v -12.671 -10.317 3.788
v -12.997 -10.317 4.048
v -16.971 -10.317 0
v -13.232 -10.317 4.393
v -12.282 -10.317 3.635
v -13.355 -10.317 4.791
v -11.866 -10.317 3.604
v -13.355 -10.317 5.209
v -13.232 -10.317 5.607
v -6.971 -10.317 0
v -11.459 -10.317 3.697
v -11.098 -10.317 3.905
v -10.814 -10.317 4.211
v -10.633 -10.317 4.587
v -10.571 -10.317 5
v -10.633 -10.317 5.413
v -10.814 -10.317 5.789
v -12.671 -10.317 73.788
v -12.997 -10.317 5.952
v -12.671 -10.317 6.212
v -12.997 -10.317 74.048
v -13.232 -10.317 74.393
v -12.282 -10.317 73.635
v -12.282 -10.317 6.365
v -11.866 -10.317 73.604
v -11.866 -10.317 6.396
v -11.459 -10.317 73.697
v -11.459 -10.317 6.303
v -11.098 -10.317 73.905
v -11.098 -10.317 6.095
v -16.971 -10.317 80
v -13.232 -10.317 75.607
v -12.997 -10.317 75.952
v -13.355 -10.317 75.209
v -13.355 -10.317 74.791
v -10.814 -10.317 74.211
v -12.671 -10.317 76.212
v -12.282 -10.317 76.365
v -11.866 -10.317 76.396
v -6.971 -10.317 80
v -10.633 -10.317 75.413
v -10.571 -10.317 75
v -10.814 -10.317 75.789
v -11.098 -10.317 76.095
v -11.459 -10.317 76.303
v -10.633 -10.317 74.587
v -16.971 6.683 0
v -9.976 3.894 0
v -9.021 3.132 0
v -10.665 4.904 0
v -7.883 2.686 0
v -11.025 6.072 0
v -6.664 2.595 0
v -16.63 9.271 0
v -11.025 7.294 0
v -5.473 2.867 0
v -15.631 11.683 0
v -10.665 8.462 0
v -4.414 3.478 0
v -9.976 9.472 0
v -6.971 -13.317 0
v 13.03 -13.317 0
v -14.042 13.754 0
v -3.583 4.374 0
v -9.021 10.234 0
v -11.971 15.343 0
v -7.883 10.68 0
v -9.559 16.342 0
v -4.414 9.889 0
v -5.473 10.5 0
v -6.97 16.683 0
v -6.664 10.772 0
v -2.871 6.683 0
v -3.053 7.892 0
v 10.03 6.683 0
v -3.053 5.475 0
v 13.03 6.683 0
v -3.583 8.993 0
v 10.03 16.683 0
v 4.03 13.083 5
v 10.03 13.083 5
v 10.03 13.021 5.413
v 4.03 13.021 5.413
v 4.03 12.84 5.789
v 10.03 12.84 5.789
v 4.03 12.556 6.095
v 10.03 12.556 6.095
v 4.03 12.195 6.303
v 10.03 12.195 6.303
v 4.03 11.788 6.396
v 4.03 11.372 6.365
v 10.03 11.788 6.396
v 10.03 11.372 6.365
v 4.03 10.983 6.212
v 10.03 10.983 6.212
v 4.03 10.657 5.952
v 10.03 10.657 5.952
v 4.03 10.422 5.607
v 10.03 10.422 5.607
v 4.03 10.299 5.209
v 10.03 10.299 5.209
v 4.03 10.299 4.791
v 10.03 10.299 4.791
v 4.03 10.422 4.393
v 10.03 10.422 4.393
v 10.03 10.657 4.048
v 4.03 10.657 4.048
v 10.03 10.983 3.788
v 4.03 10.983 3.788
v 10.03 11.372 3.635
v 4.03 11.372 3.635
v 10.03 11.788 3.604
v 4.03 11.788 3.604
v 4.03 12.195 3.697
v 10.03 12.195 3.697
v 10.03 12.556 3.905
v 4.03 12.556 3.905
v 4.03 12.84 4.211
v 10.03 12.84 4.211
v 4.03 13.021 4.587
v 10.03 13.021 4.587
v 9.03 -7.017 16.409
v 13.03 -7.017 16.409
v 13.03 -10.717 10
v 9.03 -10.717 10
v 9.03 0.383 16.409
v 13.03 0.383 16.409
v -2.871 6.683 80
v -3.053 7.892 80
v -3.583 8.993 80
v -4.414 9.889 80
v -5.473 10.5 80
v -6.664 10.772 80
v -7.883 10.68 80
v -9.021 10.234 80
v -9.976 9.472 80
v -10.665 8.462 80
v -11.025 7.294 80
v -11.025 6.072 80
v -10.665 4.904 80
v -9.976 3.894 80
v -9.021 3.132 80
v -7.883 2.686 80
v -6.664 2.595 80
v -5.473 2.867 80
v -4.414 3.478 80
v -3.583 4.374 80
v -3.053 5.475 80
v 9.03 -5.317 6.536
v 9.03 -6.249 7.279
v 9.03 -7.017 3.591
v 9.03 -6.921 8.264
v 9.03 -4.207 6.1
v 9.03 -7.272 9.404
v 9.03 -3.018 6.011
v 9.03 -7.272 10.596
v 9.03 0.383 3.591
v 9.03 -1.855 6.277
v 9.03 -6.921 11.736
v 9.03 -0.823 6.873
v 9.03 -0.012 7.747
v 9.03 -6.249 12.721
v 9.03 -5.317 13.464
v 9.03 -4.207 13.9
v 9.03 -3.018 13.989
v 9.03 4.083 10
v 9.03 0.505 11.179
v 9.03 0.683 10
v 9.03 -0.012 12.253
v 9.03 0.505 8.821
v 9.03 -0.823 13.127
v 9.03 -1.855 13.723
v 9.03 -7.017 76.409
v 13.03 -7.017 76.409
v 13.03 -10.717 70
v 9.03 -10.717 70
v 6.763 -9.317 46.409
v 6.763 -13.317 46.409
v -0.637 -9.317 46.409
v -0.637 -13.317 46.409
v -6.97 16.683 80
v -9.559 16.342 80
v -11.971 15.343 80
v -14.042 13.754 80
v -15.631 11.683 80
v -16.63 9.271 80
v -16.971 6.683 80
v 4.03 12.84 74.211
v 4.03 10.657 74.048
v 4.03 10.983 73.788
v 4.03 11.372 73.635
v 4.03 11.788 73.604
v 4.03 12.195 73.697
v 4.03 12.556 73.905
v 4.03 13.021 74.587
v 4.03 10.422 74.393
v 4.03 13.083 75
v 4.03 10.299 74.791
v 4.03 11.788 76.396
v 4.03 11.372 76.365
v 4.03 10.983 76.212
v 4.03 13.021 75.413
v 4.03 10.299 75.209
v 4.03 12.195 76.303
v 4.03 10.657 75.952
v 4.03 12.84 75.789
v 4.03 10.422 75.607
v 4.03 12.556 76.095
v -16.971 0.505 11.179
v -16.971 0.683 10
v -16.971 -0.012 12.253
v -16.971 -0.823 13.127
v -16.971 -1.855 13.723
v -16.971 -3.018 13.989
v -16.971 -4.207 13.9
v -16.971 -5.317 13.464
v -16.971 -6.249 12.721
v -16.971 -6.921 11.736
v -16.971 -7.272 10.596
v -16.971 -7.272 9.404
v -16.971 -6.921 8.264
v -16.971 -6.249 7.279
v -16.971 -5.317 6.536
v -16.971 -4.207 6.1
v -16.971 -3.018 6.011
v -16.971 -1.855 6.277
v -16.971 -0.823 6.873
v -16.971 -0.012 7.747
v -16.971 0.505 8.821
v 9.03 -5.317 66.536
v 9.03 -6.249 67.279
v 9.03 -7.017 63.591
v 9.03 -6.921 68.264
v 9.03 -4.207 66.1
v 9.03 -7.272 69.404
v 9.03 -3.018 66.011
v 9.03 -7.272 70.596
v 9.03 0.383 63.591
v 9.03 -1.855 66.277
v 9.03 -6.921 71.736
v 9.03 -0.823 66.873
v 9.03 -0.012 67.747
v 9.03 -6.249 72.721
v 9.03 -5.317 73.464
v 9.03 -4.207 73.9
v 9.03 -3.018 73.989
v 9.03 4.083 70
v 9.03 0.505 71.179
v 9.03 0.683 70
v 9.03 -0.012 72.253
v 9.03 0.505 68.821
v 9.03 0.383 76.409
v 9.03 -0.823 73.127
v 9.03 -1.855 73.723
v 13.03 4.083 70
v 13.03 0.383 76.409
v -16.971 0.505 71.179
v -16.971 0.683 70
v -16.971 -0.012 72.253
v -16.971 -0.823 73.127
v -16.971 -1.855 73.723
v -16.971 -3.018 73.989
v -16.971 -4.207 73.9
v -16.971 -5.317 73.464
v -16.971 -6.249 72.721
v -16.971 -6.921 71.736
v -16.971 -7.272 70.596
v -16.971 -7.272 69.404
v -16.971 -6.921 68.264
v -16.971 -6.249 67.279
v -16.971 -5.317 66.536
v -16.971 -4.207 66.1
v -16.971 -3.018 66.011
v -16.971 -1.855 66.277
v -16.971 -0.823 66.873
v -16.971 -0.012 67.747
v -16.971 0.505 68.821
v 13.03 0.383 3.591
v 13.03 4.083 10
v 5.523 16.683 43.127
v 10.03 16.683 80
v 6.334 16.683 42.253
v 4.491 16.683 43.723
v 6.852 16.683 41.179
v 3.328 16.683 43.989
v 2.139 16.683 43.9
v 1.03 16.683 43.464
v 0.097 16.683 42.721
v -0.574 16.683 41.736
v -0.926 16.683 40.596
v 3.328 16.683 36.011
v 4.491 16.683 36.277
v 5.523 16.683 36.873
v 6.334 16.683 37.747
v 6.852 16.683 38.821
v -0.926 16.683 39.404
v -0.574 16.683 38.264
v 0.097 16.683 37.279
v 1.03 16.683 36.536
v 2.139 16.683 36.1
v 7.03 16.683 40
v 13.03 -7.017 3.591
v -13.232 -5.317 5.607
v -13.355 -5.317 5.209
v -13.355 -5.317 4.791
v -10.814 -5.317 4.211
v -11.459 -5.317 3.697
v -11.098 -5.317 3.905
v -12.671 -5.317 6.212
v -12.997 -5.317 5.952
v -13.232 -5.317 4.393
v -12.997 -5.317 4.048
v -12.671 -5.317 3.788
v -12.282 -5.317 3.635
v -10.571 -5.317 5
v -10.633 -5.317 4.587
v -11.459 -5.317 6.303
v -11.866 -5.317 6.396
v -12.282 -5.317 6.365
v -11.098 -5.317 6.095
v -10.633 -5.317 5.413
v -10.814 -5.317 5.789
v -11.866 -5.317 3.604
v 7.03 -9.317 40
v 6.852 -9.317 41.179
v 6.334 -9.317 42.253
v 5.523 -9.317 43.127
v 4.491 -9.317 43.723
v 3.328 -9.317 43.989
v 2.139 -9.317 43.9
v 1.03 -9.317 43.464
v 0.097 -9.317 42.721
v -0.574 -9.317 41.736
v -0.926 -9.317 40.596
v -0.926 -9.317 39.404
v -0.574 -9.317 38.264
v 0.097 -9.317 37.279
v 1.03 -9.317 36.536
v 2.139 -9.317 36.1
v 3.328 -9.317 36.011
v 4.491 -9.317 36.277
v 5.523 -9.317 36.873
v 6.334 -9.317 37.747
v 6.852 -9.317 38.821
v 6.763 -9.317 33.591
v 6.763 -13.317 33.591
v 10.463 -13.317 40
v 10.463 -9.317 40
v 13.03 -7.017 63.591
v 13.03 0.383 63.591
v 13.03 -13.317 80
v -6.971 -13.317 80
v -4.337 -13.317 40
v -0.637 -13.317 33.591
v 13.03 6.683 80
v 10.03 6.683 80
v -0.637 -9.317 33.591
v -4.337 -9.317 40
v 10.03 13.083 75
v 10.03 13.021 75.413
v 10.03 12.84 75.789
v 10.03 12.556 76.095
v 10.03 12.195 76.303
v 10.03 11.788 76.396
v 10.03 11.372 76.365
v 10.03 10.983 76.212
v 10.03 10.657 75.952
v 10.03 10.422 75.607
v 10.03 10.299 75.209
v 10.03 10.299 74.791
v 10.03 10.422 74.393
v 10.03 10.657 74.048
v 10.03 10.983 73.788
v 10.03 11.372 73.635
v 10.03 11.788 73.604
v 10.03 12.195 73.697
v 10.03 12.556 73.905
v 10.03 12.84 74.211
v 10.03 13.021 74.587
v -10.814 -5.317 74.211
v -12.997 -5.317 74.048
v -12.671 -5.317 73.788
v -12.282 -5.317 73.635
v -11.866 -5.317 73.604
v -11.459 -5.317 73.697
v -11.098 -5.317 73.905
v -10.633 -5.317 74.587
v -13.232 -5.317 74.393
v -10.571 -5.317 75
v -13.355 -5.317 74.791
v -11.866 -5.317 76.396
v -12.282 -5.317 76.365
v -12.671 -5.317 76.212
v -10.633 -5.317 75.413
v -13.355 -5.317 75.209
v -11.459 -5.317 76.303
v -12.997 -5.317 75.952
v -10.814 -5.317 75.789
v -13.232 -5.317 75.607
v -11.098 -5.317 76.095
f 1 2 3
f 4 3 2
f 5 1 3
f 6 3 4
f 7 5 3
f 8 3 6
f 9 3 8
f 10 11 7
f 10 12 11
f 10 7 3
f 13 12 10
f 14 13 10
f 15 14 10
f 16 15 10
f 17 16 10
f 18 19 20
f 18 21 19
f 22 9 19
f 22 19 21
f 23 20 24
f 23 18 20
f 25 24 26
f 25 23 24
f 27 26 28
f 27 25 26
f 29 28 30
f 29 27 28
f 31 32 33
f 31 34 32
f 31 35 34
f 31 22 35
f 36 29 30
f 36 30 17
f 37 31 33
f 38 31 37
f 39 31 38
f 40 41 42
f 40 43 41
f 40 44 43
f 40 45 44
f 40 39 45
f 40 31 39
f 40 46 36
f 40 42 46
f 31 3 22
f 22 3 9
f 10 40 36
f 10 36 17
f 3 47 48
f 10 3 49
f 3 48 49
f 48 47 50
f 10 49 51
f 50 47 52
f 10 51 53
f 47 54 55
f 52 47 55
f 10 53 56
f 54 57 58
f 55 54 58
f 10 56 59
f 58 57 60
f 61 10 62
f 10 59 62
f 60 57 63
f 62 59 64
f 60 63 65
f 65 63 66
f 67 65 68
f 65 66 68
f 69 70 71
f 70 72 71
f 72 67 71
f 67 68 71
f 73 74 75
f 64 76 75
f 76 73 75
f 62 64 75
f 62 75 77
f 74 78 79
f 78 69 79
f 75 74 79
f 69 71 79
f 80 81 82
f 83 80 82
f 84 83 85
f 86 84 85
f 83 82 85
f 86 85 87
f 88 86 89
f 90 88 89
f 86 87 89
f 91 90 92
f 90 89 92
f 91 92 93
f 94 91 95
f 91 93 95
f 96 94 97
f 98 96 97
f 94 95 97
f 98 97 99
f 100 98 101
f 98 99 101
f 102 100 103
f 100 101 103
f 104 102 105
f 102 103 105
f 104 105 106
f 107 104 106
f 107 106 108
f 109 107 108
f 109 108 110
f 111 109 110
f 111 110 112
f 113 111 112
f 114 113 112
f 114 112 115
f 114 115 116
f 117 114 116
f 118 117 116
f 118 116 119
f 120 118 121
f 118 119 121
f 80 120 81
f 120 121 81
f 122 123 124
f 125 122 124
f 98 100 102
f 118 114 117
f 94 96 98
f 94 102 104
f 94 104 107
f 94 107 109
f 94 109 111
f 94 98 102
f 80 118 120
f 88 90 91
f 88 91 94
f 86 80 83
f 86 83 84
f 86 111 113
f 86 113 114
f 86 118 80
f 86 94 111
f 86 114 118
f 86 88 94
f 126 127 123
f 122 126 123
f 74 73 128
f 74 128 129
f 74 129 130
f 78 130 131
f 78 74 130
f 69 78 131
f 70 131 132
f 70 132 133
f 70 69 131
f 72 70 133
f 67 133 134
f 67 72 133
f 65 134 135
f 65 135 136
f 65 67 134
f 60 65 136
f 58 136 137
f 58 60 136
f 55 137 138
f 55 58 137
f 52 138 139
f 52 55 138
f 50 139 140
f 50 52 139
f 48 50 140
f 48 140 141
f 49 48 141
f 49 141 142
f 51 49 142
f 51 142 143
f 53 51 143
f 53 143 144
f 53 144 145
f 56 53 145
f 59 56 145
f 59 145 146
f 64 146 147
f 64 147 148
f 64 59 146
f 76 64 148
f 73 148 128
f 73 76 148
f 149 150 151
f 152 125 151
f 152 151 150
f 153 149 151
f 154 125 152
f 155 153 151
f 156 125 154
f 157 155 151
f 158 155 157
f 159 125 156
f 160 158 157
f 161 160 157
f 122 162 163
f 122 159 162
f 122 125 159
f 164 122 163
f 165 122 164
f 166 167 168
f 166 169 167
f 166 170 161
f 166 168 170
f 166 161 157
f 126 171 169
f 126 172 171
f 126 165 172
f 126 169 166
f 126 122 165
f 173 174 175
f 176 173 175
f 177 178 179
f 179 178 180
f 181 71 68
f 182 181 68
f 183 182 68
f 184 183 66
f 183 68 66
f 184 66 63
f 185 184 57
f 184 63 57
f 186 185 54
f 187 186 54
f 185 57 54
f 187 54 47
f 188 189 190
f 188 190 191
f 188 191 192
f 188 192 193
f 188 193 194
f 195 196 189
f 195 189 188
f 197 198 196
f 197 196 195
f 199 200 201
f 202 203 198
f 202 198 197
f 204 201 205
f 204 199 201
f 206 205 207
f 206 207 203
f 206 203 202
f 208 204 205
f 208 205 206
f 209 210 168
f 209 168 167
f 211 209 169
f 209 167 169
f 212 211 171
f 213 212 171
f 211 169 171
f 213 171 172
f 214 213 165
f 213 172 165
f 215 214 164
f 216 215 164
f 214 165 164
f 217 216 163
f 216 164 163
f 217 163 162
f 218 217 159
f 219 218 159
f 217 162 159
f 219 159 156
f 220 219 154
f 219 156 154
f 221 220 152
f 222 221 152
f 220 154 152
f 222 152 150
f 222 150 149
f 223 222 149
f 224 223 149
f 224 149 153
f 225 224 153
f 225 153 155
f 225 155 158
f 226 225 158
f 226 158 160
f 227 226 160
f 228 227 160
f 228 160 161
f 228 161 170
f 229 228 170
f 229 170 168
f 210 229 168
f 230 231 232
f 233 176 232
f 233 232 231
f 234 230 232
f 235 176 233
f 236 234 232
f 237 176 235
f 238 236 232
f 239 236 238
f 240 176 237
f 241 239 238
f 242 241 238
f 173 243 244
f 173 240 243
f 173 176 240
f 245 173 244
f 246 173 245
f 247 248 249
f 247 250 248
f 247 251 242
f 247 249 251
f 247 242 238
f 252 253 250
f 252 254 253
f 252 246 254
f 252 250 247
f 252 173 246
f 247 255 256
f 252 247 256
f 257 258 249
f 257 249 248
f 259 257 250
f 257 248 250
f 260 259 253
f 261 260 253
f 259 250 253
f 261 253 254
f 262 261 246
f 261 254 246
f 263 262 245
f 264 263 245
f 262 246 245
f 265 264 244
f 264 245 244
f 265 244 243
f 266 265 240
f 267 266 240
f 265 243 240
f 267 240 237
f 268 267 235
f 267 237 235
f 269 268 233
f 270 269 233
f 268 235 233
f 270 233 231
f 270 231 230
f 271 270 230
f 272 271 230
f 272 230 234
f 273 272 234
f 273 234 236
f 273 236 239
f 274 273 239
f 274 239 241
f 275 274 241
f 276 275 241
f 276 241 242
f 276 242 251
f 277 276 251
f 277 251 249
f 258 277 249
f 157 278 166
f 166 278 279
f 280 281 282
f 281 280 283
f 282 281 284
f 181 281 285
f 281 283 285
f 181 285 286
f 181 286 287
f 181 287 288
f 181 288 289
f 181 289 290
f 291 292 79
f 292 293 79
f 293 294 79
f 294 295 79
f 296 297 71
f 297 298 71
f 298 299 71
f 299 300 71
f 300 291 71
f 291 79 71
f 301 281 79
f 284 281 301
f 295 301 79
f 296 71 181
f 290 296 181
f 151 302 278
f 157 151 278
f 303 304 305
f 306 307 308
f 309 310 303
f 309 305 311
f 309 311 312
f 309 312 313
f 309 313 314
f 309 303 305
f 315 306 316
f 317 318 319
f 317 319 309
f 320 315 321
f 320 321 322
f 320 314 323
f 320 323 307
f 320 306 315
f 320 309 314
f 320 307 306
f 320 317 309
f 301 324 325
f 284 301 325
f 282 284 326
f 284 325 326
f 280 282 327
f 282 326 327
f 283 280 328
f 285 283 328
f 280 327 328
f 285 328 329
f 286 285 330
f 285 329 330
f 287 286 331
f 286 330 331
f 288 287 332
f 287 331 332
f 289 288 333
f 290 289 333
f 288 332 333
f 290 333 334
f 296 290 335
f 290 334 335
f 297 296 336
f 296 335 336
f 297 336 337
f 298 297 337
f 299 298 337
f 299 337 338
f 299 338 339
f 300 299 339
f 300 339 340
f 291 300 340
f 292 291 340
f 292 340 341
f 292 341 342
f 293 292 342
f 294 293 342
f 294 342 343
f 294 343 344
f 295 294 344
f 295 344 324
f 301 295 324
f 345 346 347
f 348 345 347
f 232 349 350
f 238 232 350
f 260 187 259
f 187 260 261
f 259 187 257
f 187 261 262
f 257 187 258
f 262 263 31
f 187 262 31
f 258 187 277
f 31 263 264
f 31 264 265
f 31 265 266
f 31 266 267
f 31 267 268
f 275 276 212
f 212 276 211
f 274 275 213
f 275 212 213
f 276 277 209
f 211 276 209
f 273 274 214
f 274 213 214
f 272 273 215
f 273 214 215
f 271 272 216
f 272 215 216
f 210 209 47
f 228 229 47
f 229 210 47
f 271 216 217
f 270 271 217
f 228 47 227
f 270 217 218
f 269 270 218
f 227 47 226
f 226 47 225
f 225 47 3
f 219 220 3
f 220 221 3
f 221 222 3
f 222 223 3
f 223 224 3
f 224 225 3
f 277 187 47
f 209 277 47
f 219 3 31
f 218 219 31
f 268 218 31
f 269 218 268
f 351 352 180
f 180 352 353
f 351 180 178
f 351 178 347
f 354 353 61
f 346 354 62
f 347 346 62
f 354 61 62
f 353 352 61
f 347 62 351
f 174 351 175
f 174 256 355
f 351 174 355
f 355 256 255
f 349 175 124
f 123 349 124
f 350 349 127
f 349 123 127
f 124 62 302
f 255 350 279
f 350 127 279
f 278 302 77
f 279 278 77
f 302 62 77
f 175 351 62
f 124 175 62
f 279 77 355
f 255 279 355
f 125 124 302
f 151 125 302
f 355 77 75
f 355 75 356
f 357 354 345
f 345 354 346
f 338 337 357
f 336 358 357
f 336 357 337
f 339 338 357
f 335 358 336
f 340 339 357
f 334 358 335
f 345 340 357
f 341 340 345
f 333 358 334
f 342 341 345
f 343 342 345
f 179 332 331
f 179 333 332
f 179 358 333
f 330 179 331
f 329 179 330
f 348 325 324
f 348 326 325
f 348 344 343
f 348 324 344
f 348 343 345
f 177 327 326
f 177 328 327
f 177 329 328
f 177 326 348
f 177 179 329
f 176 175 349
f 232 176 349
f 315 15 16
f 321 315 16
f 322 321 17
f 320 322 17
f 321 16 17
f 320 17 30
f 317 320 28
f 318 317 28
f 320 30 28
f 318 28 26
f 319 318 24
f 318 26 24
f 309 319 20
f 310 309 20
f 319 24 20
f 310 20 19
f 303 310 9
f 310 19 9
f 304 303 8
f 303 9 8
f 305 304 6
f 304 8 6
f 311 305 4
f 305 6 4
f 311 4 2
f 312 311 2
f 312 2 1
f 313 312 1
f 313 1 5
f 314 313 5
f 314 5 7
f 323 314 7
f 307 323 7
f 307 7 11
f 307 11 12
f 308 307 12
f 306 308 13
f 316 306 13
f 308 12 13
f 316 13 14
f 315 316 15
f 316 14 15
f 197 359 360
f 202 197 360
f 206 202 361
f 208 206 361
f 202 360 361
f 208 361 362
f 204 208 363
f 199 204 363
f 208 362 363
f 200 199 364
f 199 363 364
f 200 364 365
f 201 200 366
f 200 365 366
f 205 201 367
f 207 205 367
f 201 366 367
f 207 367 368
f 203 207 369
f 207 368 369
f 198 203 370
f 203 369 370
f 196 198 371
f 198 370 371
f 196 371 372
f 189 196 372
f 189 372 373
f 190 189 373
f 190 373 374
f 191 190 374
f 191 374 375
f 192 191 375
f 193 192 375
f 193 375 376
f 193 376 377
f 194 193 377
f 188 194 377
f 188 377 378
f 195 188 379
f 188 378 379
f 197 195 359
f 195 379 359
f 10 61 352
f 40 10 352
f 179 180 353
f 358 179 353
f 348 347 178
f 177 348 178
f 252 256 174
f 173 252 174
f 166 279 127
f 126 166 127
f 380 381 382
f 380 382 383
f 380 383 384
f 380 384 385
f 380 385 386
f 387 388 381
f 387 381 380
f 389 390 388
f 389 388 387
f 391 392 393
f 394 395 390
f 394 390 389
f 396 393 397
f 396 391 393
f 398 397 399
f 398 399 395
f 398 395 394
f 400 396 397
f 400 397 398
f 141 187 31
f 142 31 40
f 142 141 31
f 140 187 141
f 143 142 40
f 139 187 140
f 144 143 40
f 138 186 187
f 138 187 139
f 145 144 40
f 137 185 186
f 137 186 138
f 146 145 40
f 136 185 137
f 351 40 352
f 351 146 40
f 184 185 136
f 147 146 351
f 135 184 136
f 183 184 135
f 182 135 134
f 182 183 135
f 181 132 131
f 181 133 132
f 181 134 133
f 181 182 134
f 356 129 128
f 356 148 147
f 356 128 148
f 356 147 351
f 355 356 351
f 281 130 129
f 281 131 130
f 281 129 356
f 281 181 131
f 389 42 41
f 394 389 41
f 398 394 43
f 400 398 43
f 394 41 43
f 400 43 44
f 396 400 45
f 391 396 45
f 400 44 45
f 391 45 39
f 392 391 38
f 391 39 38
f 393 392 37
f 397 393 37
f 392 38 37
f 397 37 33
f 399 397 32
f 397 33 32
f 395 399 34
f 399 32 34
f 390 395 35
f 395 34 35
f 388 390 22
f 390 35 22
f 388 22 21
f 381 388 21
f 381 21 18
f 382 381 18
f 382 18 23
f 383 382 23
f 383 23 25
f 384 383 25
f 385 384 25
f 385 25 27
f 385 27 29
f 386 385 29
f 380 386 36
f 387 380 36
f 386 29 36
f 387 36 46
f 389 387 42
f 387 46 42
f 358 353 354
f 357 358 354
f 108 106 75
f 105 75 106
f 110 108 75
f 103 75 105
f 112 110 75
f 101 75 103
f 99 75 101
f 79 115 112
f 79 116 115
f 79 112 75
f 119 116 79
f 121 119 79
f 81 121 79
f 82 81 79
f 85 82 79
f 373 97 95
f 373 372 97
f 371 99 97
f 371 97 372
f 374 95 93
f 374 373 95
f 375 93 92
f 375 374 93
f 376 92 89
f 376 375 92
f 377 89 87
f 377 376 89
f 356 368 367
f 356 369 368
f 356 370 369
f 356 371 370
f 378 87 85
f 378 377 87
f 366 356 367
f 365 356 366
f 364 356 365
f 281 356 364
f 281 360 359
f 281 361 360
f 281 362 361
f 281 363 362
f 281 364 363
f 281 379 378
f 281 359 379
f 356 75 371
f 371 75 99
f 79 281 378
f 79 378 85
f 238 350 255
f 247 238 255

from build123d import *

# Parameters (mm, degrees)
SKETCH004_R  = 1.4
PAD002_DEPTH = 6
SKETCH007_R  = 4
PAD003_DEPTH = 31
SKETCH001_R  = 4
PAD004_DEPTH = 31
SKETCH006_R  = 1.4
PAD005_DEPTH = 5
PAD006_DEPTH = 4
SKETCH003_W  = 10
SKETCH003_H  = 80
PAD007_DEPTH = 3
SKETCH005_W  = 10
SKETCH005_H  = 80
PAD008_DEPTH = 3
PAD001_DEPTH = 4
SKETCH_R     = 4.1
PAD_DEPTH    = 80


with BuildPart() as pleximount02:
    # Sketch004 → Pad002 (new body)
    with BuildSketch(Plane.YZ.offset(10.029501)):
        with Locations((11.683203, 75)):
            Circle(SKETCH004_R)
        with Locations((11.683203, 5)):
            Circle(SKETCH004_R)
    extrude(amount=-PAD002_DEPTH)


with BuildPart() as rodhole01:
    # Sketch007 → Pad003 (new body)
    with BuildSketch(Plane.XZ.offset(13.316829)):
        with Locations((3.029501, 40)):
            Circle(SKETCH007_R)
    extrude(amount=-PAD003_DEPTH)


with BuildPart() as rodhole02:
    # Sketch001 → Pad004 (new body)
    with BuildSketch(Plane.YZ.offset(13.029501)):
        with Locations((-3.316797, 70)):
            Circle(SKETCH001_R)
        with Locations((-3.316797, 10)):
            Circle(SKETCH001_R)
    extrude(amount=-PAD004_DEPTH)


with BuildPart() as pleximount01:
    # Sketch006 → Pad005 (new body)
    with BuildSketch(Plane.XZ.offset(10.316829)):
        with Locations((-11.970531, 75)):
            Circle(SKETCH006_R)
        with Locations((-11.970531, 5)):
            Circle(SKETCH006_R)
    extrude(amount=-PAD005_DEPTH)


with BuildPart() as sidenutflush02:
    # Sketch002 → Pad006 (new body)
    with BuildSketch(Plane.YZ.offset(13.029501)):
        Polygon((4.083203, 70), (0.383203, 76.408588), (-7.016797, 76.408588), (-10.716797, 70), (-7.016797, 63.591412), (0.383203, 63.591412), align=None)
        Polygon((0.383203, 3.591412), (4.083203, 10), (0.383203, 16.408588), (-7.016797, 16.408588), (-10.716797, 10), (-7.016797, 3.591412), align=None)
    extrude(amount=-PAD006_DEPTH)


with BuildPart() as plexiflush02:
    # Sketch003 → Pad007 (new body)
    with BuildSketch(Plane.YZ.offset(13.029501)):
        with Locations((11.683203, 40)):
            Rectangle(SKETCH003_W, SKETCH003_H)
    extrude(amount=-PAD007_DEPTH)


with BuildPart() as plexiflush01:
    # Sketch005 → Pad008 (new body)
    with BuildSketch(Plane.XZ.offset(13.316829)):
        with Locations((-11.970531, 40)):
            Rectangle(SKETCH005_W, SKETCH005_H)
    extrude(amount=-PAD008_DEPTH)


with BuildPart() as cutblock:
    # Sketch008 → Pad001 (new body)
    with BuildSketch(Plane.XZ.offset(13.316829)):
        Polygon((6.763311, 33.591412), (10.463311, 40), (6.763311, 46.408588), (-0.636689, 46.408588), (-4.336689, 40), (-0.636689, 33.591412), align=None)
    extrude(amount=-PAD001_DEPTH)

    # Fusion: union PlexiMount02, RodHole01, RodHole02, PlexiMount01, SideNutFlush02, PlexiFlush02, PlexiFlush01
    add(pleximount02.part)
    add(rodhole01.part)
    add(rodhole02.part)
    add(pleximount01.part)
    add(sidenutflush02.part)
    add(plexiflush02.part)
    add(plexiflush01.part)


with BuildPart() as final:
    # Sketch → Pad (new body)
    with BuildSketch(Plane.XY):
        with BuildLine():
            Line((-16.970531, 6.683171), (-16.970531, -13.316829))
            Line((-16.970531, -13.316829), (13.029501, -13.316829))
            Line((13.029501, -13.316829), (13.029501, 16.683203))
            Line((13.029501, 16.683203), (-6.970499, 16.683203))
            ThreePointArc((-6.970499, 16.683203), (-14.041599, 13.754271), (-16.970531, 6.683171))
        make_face()
        with Locations((-6.970531, 6.683203)):
            Circle(SKETCH_R, mode=Mode.SUBTRACT)
    extrude(amount=PAD_DEPTH)

    # Cut: cut CutBlock
    add(cutblock.part, mode=Mode.SUBTRACT)


solid = final.part
